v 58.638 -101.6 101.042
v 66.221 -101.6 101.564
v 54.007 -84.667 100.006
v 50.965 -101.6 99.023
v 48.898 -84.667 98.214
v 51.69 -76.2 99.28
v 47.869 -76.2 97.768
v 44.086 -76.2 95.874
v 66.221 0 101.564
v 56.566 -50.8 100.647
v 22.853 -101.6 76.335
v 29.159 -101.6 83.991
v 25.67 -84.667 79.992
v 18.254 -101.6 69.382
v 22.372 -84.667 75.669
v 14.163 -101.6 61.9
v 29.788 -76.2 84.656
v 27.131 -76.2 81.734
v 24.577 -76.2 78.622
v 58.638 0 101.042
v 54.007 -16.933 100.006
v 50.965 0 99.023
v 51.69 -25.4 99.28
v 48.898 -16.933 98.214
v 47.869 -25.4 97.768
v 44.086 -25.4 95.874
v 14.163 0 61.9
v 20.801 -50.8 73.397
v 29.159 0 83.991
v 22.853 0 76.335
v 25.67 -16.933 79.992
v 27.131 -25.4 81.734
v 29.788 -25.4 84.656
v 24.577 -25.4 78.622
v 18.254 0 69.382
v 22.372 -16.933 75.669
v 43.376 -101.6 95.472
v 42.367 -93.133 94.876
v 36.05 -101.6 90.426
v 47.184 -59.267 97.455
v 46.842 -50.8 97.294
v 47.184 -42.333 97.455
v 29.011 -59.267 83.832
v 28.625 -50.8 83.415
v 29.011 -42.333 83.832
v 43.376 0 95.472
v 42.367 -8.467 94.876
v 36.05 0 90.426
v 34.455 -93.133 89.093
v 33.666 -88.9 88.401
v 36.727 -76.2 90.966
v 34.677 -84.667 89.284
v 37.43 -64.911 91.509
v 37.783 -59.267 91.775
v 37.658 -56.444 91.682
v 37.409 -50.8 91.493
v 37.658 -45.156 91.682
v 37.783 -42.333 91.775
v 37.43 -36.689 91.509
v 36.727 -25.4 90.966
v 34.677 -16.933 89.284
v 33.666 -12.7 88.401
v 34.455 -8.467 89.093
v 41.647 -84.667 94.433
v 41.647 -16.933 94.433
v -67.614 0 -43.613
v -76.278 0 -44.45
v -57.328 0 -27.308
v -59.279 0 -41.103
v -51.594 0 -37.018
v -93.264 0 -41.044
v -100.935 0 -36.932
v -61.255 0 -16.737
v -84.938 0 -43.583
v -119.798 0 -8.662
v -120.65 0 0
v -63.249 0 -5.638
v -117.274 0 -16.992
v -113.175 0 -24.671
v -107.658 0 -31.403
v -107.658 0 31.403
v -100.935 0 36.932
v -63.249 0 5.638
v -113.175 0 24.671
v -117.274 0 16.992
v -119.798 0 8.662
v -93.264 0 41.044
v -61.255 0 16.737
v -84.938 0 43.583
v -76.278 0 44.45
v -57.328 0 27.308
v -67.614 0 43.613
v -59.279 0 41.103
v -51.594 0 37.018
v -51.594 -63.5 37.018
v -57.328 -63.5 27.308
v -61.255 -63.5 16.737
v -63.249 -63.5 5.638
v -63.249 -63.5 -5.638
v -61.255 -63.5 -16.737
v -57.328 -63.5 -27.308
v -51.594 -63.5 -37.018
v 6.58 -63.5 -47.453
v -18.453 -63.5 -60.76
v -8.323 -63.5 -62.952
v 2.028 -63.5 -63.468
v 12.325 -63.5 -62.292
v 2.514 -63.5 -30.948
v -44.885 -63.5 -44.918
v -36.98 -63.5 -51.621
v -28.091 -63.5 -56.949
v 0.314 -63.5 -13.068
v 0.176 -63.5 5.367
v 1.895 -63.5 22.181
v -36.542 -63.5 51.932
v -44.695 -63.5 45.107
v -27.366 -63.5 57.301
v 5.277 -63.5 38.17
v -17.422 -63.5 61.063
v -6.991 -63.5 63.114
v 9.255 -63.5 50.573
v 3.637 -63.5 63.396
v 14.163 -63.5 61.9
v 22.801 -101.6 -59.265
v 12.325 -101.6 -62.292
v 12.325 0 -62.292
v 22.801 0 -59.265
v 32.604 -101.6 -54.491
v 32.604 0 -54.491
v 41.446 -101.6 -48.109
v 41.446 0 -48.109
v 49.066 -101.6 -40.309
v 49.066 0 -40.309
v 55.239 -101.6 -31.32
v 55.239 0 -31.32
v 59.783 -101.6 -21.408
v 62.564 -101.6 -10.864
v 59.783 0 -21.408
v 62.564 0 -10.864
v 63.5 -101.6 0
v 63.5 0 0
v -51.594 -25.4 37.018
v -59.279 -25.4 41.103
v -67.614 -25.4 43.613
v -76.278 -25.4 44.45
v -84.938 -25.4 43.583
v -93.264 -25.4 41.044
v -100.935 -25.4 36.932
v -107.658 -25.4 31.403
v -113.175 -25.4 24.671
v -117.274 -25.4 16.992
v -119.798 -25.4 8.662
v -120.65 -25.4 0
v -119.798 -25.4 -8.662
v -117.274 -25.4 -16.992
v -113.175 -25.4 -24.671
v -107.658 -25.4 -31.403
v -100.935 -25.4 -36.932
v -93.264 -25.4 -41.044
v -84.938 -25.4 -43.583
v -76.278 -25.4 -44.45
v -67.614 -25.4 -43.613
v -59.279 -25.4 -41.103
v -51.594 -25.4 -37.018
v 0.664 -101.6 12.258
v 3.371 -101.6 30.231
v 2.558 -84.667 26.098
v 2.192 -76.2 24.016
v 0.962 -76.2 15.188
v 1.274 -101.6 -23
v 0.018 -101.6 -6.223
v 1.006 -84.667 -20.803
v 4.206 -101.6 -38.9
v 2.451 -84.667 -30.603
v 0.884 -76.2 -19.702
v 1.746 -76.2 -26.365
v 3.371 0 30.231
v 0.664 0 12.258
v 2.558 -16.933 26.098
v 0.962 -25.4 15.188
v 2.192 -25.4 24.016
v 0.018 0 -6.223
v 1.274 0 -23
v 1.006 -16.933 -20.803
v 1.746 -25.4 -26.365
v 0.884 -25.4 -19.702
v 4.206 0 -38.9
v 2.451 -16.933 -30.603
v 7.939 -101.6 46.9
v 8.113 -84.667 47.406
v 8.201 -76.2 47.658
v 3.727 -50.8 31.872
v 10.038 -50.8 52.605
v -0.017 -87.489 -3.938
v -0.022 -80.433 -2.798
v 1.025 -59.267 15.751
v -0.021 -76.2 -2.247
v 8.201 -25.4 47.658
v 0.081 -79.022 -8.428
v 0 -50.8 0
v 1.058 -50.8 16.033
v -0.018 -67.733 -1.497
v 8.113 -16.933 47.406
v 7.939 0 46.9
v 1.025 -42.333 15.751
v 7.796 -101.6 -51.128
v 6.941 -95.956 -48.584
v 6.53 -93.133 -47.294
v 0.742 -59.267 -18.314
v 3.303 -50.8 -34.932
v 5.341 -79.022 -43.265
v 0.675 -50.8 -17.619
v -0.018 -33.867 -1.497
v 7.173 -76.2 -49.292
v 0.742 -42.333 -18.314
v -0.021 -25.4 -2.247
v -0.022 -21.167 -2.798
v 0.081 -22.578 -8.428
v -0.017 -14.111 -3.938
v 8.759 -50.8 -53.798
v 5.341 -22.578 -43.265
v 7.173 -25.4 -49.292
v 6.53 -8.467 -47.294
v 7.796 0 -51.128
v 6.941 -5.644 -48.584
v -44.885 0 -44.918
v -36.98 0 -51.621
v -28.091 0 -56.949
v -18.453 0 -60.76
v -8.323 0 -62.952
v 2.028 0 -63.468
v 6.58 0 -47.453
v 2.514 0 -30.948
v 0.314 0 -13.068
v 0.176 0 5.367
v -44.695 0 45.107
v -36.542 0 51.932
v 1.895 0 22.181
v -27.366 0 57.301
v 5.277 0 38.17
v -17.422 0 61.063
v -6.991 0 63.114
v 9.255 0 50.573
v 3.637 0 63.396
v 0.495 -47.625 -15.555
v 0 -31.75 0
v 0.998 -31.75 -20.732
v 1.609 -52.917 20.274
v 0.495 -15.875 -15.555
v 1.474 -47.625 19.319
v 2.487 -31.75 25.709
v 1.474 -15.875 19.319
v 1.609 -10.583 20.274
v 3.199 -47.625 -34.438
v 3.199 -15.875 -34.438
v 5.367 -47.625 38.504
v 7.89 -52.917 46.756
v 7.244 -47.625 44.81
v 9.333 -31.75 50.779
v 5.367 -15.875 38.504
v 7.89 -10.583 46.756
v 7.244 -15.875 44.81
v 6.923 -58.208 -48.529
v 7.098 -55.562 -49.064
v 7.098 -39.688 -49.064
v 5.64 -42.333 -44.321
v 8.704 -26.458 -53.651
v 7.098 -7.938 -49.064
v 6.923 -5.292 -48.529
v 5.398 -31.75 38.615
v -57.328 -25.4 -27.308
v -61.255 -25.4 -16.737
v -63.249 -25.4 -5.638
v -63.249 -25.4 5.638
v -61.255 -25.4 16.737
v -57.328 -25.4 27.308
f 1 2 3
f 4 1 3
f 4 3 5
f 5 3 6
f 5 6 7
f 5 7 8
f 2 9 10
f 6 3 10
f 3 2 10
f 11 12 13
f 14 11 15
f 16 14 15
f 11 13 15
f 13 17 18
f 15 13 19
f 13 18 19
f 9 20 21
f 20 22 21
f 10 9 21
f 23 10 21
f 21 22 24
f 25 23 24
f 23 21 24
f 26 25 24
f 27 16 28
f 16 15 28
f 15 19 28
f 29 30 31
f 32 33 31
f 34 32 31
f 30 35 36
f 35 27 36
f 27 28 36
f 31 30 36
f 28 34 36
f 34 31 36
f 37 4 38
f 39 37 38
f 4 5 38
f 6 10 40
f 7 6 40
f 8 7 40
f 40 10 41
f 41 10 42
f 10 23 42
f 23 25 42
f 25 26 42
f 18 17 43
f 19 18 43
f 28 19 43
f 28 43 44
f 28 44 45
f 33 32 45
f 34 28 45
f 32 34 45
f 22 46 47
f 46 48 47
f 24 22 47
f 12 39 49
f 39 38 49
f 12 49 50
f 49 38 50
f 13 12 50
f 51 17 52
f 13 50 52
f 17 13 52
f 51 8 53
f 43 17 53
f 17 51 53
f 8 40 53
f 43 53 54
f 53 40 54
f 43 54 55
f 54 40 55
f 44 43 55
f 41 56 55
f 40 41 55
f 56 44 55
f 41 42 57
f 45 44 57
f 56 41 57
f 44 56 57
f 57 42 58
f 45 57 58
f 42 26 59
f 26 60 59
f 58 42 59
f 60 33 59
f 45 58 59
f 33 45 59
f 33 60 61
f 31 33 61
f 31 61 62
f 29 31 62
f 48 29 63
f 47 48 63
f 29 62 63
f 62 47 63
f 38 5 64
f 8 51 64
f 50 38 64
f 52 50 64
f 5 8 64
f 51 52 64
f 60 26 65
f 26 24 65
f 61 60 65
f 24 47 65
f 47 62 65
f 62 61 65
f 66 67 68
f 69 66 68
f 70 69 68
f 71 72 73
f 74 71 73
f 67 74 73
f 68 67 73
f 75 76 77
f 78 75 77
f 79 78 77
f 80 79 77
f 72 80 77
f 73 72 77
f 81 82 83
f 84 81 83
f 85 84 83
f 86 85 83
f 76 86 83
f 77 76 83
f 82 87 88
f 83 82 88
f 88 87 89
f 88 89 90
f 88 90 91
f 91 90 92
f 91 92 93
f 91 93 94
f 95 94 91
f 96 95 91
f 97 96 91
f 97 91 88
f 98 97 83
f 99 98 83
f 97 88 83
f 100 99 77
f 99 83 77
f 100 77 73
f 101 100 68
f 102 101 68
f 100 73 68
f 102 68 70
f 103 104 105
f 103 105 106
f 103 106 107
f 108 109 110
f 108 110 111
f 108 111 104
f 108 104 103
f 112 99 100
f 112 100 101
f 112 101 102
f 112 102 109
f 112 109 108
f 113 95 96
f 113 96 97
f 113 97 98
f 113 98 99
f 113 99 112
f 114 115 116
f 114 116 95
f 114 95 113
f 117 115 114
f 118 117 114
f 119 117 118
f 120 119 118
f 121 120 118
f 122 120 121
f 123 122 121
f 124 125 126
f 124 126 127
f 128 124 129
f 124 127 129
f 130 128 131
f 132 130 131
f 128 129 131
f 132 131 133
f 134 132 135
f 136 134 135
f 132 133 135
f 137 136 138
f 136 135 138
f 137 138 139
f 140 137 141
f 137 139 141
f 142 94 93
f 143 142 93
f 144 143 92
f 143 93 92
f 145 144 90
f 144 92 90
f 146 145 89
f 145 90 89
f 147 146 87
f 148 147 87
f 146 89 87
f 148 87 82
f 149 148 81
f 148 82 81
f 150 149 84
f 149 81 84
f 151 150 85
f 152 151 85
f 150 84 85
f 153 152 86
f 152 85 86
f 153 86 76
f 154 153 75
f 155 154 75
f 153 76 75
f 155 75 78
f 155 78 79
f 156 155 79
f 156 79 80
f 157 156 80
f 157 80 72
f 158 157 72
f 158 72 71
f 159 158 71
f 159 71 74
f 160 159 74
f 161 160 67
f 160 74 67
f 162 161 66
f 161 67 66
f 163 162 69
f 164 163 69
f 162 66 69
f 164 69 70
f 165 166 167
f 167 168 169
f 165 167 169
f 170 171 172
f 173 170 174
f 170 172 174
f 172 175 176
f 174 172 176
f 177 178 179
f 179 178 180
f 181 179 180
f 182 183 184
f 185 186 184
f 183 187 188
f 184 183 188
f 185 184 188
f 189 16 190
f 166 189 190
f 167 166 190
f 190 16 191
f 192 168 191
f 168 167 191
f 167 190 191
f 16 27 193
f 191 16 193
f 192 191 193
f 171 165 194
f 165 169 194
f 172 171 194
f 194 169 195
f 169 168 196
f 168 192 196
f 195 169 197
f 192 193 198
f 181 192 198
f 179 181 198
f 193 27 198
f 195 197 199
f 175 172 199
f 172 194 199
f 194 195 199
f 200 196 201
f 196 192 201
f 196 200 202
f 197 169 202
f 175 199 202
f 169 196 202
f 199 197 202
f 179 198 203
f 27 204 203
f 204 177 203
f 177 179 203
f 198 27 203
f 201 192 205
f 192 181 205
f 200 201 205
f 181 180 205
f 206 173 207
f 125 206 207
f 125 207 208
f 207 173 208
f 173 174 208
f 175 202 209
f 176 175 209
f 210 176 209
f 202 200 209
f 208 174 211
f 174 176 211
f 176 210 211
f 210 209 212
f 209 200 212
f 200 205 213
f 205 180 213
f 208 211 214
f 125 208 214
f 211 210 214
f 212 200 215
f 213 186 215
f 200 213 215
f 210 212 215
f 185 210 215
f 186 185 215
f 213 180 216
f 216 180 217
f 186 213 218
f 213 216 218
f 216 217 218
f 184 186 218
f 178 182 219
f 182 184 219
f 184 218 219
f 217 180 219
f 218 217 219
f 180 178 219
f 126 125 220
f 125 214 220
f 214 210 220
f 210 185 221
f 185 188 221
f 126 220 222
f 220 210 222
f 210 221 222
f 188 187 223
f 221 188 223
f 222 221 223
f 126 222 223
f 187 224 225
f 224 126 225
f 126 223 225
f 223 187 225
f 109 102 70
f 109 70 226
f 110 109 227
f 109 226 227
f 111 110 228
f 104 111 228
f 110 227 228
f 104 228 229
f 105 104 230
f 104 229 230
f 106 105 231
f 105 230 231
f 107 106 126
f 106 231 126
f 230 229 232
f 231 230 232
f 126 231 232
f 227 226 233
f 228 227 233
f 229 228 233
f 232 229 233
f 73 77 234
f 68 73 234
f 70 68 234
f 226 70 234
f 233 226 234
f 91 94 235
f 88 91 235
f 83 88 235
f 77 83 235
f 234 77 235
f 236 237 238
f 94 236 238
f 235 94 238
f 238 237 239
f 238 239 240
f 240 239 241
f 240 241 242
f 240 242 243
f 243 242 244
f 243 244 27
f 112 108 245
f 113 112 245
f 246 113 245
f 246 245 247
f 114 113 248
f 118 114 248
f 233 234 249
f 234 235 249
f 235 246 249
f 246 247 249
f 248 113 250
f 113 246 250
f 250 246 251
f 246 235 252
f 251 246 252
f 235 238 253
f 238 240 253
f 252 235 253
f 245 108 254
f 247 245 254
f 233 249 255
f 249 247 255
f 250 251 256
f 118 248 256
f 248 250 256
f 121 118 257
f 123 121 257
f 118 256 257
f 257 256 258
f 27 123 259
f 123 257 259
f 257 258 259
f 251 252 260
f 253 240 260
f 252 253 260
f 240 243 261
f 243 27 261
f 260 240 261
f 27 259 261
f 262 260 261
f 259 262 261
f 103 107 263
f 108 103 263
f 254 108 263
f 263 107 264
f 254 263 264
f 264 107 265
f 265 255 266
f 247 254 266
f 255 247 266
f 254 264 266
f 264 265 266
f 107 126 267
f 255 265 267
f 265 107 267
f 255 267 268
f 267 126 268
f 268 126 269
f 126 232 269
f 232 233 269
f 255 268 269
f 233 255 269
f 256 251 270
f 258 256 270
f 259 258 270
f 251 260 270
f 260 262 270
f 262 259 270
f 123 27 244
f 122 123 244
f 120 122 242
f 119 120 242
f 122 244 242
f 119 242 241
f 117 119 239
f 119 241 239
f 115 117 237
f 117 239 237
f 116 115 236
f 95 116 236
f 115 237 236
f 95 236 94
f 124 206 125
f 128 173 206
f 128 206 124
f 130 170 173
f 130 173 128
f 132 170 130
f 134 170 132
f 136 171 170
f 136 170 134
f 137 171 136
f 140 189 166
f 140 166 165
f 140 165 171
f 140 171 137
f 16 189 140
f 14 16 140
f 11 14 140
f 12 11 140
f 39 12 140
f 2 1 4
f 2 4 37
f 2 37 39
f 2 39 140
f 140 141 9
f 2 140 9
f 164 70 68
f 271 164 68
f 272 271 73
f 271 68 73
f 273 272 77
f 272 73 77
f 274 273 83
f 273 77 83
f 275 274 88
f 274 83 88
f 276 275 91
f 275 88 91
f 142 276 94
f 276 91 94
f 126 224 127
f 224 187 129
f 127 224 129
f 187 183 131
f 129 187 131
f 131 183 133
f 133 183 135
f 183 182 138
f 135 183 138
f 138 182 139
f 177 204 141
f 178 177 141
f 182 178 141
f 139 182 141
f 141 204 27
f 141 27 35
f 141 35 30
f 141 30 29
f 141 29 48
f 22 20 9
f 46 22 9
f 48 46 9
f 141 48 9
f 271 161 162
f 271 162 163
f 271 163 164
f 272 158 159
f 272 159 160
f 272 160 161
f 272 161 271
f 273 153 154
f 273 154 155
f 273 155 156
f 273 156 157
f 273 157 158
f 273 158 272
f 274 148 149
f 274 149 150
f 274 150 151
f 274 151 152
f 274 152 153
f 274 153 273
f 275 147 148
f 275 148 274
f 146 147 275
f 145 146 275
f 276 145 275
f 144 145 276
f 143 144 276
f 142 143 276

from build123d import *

# Parameters (mm, degrees)
F1_DEPTH = 25.4
F2_DEPTH = 63.5
F3_DEPTH = 101.6


with BuildPart() as f1:
    # F0 (on Front) → F1 (new body)
    with BuildSketch(Plane.XZ):
        with BuildLine():
            ThreePointArc((-51.59375, -37.0180356169), (-60.4501990278, -19.4428248333), (-63.5, 0))
            ThreePointArc((-63.5, 0), (-60.4501990278, 19.4428248333), (-51.59375, 37.0180356169))
            ThreePointArc((-51.59375, 37.0180356169), (-120.65, 0), (-51.59375, -37.0180356169))
        make_face()
    extrude(amount=F1_DEPTH)


with BuildPart() as f2:
    # F0 (on Front) → F2 (new body)
    with BuildSketch(Plane.XZ):
        with BuildLine():
            Line((-31.75, 0), (0, 0))
            add(Edge.make_bspline(
                [(14.1632788945, 61.9003354672), (0.5636968609, 34.5258018774), (0, 0)],
                knots=[0.9322474365, 0.9322474365, 0.9322474365, 1.5875365671, 1.5875365671, 1.5875365671], degree=2, weights=[1, 0.9468029807, 1]))
            ThreePointArc((14.1632788945, 61.9003354672), (-22.4731451572, 59.3903001065), (-51.59375, 37.0180356169))
            ThreePointArc((-51.59375, 37.0180356169), (-37.0237934934, 21.0006510316), (-31.75, 0))
        make_face()
        with BuildLine():
            add(Edge.make_bspline(
                [(0, 0), (-0.5682123889, -34.8023729145), (12.3249432224, -62.2924214858)],
                knots=[1.5875365671, 1.5875365671, 1.5875365671, 2.2477031853, 2.2477031853, 2.2477031853], degree=2, weights=[1, 0.9460153445, 1]))
            Line((0, 0), (-31.75, 0))
            ThreePointArc((-31.75, 0), (-37.0237934934, -21.0006510316), (-51.59375, -37.0180356169))
            ThreePointArc((-51.59375, -37.0180356169), (-23.3496989637, -59.0511774506), (12.3249432224, -62.2924214858))
        make_face()
        with BuildLine():
            Line((-63.5, 0), (-31.75, 0))
            ThreePointArc((-31.75, 0), (-37.0237934934, 21.0006510316), (-51.59375, 37.0180356169))
            ThreePointArc((-51.59375, 37.0180356169), (-60.4501990278, 19.4428248333), (-63.5, 0))
        make_face()
        with BuildLine():
            ThreePointArc((-51.59375, -37.0180356169), (-37.0237934934, -21.0006510316), (-31.75, 0))
            Line((-31.75, 0), (-63.5, 0))
            ThreePointArc((-63.5, 0), (-60.4501990278, -19.4428248333), (-51.59375, -37.0180356169))
        make_face()
    extrude(amount=F2_DEPTH)


with BuildPart() as f3:
    # F0 (on Front) → F3 (new body)
    with BuildSketch(Plane.XZ):
        with BuildLine():
            add(Edge.make_bspline(
                [(66.2211663616, 101.5635527817), (34.292824118, 102.4190007107), (14.1632788945, 61.9003354672)],
                knots=[0, 0, 0, 0.9322474365, 0.9322474365, 0.9322474365], degree=2, weights=[1, 0.8933171005, 1]))
            ThreePointArc((14.1632788945, 61.9003354672), (49.6569139687, 39.578288178), (63.5, 0))
            Line((63.5, 0), (66.2211663616, 101.5635527817))
        make_face()
        with BuildLine():
            add(Edge.make_bspline(
                [(14.1632788945, 61.9003354672), (0.5636968609, 34.5258018774), (0, 0)],
                knots=[0.9322474365, 0.9322474365, 0.9322474365, 1.5875365671, 1.5875365671, 1.5875365671], degree=2, weights=[1, 0.9468029807, 1]))
            add(Edge.make_bspline(
                [(0, 0), (-0.5682123889, -34.8023729145), (12.3249432224, -62.2924214858)],
                knots=[1.5875365671, 1.5875365671, 1.5875365671, 2.2477031853, 2.2477031853, 2.2477031853], degree=2, weights=[1, 0.9460153445, 1]))
            ThreePointArc((12.3249432224, -62.2924214858), (49.0656901237, -40.3089078578), (63.5, 0))
            ThreePointArc((63.5, 0), (49.6569139687, 39.578288178), (14.1632788945, 61.9003354672))
        make_face()
    extrude(amount=F3_DEPTH)


solid = Compound([f1.part, f2.part, f3.part])
